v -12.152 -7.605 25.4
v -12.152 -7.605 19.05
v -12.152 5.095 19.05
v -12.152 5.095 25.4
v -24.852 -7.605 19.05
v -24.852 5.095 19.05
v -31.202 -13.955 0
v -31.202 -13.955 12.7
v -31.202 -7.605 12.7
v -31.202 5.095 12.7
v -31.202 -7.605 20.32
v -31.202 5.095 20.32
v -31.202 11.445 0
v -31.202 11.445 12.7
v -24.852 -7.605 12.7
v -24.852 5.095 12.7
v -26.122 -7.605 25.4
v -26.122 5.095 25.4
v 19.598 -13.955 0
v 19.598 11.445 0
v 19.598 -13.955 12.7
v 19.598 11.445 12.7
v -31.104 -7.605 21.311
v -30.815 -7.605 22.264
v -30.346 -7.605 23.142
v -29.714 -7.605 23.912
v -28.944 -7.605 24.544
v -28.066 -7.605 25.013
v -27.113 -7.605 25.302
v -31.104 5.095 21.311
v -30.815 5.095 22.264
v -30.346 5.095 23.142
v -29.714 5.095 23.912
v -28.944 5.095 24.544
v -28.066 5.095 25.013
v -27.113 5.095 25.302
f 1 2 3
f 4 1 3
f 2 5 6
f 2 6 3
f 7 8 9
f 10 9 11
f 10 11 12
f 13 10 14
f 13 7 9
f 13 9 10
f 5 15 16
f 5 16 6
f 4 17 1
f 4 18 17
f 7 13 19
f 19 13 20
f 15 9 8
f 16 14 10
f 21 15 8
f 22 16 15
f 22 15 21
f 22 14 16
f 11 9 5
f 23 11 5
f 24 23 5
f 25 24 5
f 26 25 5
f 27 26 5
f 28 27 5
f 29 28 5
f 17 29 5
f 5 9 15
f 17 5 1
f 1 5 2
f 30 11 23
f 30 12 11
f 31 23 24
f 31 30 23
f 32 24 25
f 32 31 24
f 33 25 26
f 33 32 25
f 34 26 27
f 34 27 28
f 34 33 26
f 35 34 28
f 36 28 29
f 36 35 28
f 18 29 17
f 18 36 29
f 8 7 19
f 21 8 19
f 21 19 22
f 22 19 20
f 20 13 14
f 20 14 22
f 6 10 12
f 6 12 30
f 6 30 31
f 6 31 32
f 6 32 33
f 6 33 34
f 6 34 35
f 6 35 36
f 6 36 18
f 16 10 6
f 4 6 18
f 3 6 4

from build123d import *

# Parameters (mm, degrees)
F0_W     = 50.8
F0_H     = 25.4
F1_DEPTH = 12.7
F2_W     = 19.05
F2_H     = 12.7
F3_DEPTH = 12.7
F4_W     = 12.7
F4_H     = 6.35
F5_DEPTH = 12.7
F6_R     = 5.08


with BuildPart() as f1:
    # F0 (on Top) → F1 (new body)
    with BuildSketch(Plane.XY):
        with Locations((-5.801945, -1.255406)):
            Rectangle(F0_W, F0_H)
    extrude(amount=F1_DEPTH)

    # F2 (on face) → F3 (join)
    with BuildSketch(Plane.XY.offset(12.7)):
        with Locations((-21.676945, -1.255406)):
            Rectangle(F2_W, F2_H)
    extrude(amount=F3_DEPTH)

    # F4 (on face) → F5 (cut, through all)
    with BuildSketch(Plane.XZ.offset(7.605406)):
        with Locations((-18.501945, 15.875)):
            Rectangle(F4_W, F4_H)
    extrude(amount=-F5_DEPTH, mode=Mode.SUBTRACT)

    # F6
    f6_edges = [f1.edges().sort_by_distance(p)[0] for p in [
        (-31.201945, -1.255406, 25.4),
    ]]
    fillet(f6_edges, radius=F6_R)


solid = f1.part
